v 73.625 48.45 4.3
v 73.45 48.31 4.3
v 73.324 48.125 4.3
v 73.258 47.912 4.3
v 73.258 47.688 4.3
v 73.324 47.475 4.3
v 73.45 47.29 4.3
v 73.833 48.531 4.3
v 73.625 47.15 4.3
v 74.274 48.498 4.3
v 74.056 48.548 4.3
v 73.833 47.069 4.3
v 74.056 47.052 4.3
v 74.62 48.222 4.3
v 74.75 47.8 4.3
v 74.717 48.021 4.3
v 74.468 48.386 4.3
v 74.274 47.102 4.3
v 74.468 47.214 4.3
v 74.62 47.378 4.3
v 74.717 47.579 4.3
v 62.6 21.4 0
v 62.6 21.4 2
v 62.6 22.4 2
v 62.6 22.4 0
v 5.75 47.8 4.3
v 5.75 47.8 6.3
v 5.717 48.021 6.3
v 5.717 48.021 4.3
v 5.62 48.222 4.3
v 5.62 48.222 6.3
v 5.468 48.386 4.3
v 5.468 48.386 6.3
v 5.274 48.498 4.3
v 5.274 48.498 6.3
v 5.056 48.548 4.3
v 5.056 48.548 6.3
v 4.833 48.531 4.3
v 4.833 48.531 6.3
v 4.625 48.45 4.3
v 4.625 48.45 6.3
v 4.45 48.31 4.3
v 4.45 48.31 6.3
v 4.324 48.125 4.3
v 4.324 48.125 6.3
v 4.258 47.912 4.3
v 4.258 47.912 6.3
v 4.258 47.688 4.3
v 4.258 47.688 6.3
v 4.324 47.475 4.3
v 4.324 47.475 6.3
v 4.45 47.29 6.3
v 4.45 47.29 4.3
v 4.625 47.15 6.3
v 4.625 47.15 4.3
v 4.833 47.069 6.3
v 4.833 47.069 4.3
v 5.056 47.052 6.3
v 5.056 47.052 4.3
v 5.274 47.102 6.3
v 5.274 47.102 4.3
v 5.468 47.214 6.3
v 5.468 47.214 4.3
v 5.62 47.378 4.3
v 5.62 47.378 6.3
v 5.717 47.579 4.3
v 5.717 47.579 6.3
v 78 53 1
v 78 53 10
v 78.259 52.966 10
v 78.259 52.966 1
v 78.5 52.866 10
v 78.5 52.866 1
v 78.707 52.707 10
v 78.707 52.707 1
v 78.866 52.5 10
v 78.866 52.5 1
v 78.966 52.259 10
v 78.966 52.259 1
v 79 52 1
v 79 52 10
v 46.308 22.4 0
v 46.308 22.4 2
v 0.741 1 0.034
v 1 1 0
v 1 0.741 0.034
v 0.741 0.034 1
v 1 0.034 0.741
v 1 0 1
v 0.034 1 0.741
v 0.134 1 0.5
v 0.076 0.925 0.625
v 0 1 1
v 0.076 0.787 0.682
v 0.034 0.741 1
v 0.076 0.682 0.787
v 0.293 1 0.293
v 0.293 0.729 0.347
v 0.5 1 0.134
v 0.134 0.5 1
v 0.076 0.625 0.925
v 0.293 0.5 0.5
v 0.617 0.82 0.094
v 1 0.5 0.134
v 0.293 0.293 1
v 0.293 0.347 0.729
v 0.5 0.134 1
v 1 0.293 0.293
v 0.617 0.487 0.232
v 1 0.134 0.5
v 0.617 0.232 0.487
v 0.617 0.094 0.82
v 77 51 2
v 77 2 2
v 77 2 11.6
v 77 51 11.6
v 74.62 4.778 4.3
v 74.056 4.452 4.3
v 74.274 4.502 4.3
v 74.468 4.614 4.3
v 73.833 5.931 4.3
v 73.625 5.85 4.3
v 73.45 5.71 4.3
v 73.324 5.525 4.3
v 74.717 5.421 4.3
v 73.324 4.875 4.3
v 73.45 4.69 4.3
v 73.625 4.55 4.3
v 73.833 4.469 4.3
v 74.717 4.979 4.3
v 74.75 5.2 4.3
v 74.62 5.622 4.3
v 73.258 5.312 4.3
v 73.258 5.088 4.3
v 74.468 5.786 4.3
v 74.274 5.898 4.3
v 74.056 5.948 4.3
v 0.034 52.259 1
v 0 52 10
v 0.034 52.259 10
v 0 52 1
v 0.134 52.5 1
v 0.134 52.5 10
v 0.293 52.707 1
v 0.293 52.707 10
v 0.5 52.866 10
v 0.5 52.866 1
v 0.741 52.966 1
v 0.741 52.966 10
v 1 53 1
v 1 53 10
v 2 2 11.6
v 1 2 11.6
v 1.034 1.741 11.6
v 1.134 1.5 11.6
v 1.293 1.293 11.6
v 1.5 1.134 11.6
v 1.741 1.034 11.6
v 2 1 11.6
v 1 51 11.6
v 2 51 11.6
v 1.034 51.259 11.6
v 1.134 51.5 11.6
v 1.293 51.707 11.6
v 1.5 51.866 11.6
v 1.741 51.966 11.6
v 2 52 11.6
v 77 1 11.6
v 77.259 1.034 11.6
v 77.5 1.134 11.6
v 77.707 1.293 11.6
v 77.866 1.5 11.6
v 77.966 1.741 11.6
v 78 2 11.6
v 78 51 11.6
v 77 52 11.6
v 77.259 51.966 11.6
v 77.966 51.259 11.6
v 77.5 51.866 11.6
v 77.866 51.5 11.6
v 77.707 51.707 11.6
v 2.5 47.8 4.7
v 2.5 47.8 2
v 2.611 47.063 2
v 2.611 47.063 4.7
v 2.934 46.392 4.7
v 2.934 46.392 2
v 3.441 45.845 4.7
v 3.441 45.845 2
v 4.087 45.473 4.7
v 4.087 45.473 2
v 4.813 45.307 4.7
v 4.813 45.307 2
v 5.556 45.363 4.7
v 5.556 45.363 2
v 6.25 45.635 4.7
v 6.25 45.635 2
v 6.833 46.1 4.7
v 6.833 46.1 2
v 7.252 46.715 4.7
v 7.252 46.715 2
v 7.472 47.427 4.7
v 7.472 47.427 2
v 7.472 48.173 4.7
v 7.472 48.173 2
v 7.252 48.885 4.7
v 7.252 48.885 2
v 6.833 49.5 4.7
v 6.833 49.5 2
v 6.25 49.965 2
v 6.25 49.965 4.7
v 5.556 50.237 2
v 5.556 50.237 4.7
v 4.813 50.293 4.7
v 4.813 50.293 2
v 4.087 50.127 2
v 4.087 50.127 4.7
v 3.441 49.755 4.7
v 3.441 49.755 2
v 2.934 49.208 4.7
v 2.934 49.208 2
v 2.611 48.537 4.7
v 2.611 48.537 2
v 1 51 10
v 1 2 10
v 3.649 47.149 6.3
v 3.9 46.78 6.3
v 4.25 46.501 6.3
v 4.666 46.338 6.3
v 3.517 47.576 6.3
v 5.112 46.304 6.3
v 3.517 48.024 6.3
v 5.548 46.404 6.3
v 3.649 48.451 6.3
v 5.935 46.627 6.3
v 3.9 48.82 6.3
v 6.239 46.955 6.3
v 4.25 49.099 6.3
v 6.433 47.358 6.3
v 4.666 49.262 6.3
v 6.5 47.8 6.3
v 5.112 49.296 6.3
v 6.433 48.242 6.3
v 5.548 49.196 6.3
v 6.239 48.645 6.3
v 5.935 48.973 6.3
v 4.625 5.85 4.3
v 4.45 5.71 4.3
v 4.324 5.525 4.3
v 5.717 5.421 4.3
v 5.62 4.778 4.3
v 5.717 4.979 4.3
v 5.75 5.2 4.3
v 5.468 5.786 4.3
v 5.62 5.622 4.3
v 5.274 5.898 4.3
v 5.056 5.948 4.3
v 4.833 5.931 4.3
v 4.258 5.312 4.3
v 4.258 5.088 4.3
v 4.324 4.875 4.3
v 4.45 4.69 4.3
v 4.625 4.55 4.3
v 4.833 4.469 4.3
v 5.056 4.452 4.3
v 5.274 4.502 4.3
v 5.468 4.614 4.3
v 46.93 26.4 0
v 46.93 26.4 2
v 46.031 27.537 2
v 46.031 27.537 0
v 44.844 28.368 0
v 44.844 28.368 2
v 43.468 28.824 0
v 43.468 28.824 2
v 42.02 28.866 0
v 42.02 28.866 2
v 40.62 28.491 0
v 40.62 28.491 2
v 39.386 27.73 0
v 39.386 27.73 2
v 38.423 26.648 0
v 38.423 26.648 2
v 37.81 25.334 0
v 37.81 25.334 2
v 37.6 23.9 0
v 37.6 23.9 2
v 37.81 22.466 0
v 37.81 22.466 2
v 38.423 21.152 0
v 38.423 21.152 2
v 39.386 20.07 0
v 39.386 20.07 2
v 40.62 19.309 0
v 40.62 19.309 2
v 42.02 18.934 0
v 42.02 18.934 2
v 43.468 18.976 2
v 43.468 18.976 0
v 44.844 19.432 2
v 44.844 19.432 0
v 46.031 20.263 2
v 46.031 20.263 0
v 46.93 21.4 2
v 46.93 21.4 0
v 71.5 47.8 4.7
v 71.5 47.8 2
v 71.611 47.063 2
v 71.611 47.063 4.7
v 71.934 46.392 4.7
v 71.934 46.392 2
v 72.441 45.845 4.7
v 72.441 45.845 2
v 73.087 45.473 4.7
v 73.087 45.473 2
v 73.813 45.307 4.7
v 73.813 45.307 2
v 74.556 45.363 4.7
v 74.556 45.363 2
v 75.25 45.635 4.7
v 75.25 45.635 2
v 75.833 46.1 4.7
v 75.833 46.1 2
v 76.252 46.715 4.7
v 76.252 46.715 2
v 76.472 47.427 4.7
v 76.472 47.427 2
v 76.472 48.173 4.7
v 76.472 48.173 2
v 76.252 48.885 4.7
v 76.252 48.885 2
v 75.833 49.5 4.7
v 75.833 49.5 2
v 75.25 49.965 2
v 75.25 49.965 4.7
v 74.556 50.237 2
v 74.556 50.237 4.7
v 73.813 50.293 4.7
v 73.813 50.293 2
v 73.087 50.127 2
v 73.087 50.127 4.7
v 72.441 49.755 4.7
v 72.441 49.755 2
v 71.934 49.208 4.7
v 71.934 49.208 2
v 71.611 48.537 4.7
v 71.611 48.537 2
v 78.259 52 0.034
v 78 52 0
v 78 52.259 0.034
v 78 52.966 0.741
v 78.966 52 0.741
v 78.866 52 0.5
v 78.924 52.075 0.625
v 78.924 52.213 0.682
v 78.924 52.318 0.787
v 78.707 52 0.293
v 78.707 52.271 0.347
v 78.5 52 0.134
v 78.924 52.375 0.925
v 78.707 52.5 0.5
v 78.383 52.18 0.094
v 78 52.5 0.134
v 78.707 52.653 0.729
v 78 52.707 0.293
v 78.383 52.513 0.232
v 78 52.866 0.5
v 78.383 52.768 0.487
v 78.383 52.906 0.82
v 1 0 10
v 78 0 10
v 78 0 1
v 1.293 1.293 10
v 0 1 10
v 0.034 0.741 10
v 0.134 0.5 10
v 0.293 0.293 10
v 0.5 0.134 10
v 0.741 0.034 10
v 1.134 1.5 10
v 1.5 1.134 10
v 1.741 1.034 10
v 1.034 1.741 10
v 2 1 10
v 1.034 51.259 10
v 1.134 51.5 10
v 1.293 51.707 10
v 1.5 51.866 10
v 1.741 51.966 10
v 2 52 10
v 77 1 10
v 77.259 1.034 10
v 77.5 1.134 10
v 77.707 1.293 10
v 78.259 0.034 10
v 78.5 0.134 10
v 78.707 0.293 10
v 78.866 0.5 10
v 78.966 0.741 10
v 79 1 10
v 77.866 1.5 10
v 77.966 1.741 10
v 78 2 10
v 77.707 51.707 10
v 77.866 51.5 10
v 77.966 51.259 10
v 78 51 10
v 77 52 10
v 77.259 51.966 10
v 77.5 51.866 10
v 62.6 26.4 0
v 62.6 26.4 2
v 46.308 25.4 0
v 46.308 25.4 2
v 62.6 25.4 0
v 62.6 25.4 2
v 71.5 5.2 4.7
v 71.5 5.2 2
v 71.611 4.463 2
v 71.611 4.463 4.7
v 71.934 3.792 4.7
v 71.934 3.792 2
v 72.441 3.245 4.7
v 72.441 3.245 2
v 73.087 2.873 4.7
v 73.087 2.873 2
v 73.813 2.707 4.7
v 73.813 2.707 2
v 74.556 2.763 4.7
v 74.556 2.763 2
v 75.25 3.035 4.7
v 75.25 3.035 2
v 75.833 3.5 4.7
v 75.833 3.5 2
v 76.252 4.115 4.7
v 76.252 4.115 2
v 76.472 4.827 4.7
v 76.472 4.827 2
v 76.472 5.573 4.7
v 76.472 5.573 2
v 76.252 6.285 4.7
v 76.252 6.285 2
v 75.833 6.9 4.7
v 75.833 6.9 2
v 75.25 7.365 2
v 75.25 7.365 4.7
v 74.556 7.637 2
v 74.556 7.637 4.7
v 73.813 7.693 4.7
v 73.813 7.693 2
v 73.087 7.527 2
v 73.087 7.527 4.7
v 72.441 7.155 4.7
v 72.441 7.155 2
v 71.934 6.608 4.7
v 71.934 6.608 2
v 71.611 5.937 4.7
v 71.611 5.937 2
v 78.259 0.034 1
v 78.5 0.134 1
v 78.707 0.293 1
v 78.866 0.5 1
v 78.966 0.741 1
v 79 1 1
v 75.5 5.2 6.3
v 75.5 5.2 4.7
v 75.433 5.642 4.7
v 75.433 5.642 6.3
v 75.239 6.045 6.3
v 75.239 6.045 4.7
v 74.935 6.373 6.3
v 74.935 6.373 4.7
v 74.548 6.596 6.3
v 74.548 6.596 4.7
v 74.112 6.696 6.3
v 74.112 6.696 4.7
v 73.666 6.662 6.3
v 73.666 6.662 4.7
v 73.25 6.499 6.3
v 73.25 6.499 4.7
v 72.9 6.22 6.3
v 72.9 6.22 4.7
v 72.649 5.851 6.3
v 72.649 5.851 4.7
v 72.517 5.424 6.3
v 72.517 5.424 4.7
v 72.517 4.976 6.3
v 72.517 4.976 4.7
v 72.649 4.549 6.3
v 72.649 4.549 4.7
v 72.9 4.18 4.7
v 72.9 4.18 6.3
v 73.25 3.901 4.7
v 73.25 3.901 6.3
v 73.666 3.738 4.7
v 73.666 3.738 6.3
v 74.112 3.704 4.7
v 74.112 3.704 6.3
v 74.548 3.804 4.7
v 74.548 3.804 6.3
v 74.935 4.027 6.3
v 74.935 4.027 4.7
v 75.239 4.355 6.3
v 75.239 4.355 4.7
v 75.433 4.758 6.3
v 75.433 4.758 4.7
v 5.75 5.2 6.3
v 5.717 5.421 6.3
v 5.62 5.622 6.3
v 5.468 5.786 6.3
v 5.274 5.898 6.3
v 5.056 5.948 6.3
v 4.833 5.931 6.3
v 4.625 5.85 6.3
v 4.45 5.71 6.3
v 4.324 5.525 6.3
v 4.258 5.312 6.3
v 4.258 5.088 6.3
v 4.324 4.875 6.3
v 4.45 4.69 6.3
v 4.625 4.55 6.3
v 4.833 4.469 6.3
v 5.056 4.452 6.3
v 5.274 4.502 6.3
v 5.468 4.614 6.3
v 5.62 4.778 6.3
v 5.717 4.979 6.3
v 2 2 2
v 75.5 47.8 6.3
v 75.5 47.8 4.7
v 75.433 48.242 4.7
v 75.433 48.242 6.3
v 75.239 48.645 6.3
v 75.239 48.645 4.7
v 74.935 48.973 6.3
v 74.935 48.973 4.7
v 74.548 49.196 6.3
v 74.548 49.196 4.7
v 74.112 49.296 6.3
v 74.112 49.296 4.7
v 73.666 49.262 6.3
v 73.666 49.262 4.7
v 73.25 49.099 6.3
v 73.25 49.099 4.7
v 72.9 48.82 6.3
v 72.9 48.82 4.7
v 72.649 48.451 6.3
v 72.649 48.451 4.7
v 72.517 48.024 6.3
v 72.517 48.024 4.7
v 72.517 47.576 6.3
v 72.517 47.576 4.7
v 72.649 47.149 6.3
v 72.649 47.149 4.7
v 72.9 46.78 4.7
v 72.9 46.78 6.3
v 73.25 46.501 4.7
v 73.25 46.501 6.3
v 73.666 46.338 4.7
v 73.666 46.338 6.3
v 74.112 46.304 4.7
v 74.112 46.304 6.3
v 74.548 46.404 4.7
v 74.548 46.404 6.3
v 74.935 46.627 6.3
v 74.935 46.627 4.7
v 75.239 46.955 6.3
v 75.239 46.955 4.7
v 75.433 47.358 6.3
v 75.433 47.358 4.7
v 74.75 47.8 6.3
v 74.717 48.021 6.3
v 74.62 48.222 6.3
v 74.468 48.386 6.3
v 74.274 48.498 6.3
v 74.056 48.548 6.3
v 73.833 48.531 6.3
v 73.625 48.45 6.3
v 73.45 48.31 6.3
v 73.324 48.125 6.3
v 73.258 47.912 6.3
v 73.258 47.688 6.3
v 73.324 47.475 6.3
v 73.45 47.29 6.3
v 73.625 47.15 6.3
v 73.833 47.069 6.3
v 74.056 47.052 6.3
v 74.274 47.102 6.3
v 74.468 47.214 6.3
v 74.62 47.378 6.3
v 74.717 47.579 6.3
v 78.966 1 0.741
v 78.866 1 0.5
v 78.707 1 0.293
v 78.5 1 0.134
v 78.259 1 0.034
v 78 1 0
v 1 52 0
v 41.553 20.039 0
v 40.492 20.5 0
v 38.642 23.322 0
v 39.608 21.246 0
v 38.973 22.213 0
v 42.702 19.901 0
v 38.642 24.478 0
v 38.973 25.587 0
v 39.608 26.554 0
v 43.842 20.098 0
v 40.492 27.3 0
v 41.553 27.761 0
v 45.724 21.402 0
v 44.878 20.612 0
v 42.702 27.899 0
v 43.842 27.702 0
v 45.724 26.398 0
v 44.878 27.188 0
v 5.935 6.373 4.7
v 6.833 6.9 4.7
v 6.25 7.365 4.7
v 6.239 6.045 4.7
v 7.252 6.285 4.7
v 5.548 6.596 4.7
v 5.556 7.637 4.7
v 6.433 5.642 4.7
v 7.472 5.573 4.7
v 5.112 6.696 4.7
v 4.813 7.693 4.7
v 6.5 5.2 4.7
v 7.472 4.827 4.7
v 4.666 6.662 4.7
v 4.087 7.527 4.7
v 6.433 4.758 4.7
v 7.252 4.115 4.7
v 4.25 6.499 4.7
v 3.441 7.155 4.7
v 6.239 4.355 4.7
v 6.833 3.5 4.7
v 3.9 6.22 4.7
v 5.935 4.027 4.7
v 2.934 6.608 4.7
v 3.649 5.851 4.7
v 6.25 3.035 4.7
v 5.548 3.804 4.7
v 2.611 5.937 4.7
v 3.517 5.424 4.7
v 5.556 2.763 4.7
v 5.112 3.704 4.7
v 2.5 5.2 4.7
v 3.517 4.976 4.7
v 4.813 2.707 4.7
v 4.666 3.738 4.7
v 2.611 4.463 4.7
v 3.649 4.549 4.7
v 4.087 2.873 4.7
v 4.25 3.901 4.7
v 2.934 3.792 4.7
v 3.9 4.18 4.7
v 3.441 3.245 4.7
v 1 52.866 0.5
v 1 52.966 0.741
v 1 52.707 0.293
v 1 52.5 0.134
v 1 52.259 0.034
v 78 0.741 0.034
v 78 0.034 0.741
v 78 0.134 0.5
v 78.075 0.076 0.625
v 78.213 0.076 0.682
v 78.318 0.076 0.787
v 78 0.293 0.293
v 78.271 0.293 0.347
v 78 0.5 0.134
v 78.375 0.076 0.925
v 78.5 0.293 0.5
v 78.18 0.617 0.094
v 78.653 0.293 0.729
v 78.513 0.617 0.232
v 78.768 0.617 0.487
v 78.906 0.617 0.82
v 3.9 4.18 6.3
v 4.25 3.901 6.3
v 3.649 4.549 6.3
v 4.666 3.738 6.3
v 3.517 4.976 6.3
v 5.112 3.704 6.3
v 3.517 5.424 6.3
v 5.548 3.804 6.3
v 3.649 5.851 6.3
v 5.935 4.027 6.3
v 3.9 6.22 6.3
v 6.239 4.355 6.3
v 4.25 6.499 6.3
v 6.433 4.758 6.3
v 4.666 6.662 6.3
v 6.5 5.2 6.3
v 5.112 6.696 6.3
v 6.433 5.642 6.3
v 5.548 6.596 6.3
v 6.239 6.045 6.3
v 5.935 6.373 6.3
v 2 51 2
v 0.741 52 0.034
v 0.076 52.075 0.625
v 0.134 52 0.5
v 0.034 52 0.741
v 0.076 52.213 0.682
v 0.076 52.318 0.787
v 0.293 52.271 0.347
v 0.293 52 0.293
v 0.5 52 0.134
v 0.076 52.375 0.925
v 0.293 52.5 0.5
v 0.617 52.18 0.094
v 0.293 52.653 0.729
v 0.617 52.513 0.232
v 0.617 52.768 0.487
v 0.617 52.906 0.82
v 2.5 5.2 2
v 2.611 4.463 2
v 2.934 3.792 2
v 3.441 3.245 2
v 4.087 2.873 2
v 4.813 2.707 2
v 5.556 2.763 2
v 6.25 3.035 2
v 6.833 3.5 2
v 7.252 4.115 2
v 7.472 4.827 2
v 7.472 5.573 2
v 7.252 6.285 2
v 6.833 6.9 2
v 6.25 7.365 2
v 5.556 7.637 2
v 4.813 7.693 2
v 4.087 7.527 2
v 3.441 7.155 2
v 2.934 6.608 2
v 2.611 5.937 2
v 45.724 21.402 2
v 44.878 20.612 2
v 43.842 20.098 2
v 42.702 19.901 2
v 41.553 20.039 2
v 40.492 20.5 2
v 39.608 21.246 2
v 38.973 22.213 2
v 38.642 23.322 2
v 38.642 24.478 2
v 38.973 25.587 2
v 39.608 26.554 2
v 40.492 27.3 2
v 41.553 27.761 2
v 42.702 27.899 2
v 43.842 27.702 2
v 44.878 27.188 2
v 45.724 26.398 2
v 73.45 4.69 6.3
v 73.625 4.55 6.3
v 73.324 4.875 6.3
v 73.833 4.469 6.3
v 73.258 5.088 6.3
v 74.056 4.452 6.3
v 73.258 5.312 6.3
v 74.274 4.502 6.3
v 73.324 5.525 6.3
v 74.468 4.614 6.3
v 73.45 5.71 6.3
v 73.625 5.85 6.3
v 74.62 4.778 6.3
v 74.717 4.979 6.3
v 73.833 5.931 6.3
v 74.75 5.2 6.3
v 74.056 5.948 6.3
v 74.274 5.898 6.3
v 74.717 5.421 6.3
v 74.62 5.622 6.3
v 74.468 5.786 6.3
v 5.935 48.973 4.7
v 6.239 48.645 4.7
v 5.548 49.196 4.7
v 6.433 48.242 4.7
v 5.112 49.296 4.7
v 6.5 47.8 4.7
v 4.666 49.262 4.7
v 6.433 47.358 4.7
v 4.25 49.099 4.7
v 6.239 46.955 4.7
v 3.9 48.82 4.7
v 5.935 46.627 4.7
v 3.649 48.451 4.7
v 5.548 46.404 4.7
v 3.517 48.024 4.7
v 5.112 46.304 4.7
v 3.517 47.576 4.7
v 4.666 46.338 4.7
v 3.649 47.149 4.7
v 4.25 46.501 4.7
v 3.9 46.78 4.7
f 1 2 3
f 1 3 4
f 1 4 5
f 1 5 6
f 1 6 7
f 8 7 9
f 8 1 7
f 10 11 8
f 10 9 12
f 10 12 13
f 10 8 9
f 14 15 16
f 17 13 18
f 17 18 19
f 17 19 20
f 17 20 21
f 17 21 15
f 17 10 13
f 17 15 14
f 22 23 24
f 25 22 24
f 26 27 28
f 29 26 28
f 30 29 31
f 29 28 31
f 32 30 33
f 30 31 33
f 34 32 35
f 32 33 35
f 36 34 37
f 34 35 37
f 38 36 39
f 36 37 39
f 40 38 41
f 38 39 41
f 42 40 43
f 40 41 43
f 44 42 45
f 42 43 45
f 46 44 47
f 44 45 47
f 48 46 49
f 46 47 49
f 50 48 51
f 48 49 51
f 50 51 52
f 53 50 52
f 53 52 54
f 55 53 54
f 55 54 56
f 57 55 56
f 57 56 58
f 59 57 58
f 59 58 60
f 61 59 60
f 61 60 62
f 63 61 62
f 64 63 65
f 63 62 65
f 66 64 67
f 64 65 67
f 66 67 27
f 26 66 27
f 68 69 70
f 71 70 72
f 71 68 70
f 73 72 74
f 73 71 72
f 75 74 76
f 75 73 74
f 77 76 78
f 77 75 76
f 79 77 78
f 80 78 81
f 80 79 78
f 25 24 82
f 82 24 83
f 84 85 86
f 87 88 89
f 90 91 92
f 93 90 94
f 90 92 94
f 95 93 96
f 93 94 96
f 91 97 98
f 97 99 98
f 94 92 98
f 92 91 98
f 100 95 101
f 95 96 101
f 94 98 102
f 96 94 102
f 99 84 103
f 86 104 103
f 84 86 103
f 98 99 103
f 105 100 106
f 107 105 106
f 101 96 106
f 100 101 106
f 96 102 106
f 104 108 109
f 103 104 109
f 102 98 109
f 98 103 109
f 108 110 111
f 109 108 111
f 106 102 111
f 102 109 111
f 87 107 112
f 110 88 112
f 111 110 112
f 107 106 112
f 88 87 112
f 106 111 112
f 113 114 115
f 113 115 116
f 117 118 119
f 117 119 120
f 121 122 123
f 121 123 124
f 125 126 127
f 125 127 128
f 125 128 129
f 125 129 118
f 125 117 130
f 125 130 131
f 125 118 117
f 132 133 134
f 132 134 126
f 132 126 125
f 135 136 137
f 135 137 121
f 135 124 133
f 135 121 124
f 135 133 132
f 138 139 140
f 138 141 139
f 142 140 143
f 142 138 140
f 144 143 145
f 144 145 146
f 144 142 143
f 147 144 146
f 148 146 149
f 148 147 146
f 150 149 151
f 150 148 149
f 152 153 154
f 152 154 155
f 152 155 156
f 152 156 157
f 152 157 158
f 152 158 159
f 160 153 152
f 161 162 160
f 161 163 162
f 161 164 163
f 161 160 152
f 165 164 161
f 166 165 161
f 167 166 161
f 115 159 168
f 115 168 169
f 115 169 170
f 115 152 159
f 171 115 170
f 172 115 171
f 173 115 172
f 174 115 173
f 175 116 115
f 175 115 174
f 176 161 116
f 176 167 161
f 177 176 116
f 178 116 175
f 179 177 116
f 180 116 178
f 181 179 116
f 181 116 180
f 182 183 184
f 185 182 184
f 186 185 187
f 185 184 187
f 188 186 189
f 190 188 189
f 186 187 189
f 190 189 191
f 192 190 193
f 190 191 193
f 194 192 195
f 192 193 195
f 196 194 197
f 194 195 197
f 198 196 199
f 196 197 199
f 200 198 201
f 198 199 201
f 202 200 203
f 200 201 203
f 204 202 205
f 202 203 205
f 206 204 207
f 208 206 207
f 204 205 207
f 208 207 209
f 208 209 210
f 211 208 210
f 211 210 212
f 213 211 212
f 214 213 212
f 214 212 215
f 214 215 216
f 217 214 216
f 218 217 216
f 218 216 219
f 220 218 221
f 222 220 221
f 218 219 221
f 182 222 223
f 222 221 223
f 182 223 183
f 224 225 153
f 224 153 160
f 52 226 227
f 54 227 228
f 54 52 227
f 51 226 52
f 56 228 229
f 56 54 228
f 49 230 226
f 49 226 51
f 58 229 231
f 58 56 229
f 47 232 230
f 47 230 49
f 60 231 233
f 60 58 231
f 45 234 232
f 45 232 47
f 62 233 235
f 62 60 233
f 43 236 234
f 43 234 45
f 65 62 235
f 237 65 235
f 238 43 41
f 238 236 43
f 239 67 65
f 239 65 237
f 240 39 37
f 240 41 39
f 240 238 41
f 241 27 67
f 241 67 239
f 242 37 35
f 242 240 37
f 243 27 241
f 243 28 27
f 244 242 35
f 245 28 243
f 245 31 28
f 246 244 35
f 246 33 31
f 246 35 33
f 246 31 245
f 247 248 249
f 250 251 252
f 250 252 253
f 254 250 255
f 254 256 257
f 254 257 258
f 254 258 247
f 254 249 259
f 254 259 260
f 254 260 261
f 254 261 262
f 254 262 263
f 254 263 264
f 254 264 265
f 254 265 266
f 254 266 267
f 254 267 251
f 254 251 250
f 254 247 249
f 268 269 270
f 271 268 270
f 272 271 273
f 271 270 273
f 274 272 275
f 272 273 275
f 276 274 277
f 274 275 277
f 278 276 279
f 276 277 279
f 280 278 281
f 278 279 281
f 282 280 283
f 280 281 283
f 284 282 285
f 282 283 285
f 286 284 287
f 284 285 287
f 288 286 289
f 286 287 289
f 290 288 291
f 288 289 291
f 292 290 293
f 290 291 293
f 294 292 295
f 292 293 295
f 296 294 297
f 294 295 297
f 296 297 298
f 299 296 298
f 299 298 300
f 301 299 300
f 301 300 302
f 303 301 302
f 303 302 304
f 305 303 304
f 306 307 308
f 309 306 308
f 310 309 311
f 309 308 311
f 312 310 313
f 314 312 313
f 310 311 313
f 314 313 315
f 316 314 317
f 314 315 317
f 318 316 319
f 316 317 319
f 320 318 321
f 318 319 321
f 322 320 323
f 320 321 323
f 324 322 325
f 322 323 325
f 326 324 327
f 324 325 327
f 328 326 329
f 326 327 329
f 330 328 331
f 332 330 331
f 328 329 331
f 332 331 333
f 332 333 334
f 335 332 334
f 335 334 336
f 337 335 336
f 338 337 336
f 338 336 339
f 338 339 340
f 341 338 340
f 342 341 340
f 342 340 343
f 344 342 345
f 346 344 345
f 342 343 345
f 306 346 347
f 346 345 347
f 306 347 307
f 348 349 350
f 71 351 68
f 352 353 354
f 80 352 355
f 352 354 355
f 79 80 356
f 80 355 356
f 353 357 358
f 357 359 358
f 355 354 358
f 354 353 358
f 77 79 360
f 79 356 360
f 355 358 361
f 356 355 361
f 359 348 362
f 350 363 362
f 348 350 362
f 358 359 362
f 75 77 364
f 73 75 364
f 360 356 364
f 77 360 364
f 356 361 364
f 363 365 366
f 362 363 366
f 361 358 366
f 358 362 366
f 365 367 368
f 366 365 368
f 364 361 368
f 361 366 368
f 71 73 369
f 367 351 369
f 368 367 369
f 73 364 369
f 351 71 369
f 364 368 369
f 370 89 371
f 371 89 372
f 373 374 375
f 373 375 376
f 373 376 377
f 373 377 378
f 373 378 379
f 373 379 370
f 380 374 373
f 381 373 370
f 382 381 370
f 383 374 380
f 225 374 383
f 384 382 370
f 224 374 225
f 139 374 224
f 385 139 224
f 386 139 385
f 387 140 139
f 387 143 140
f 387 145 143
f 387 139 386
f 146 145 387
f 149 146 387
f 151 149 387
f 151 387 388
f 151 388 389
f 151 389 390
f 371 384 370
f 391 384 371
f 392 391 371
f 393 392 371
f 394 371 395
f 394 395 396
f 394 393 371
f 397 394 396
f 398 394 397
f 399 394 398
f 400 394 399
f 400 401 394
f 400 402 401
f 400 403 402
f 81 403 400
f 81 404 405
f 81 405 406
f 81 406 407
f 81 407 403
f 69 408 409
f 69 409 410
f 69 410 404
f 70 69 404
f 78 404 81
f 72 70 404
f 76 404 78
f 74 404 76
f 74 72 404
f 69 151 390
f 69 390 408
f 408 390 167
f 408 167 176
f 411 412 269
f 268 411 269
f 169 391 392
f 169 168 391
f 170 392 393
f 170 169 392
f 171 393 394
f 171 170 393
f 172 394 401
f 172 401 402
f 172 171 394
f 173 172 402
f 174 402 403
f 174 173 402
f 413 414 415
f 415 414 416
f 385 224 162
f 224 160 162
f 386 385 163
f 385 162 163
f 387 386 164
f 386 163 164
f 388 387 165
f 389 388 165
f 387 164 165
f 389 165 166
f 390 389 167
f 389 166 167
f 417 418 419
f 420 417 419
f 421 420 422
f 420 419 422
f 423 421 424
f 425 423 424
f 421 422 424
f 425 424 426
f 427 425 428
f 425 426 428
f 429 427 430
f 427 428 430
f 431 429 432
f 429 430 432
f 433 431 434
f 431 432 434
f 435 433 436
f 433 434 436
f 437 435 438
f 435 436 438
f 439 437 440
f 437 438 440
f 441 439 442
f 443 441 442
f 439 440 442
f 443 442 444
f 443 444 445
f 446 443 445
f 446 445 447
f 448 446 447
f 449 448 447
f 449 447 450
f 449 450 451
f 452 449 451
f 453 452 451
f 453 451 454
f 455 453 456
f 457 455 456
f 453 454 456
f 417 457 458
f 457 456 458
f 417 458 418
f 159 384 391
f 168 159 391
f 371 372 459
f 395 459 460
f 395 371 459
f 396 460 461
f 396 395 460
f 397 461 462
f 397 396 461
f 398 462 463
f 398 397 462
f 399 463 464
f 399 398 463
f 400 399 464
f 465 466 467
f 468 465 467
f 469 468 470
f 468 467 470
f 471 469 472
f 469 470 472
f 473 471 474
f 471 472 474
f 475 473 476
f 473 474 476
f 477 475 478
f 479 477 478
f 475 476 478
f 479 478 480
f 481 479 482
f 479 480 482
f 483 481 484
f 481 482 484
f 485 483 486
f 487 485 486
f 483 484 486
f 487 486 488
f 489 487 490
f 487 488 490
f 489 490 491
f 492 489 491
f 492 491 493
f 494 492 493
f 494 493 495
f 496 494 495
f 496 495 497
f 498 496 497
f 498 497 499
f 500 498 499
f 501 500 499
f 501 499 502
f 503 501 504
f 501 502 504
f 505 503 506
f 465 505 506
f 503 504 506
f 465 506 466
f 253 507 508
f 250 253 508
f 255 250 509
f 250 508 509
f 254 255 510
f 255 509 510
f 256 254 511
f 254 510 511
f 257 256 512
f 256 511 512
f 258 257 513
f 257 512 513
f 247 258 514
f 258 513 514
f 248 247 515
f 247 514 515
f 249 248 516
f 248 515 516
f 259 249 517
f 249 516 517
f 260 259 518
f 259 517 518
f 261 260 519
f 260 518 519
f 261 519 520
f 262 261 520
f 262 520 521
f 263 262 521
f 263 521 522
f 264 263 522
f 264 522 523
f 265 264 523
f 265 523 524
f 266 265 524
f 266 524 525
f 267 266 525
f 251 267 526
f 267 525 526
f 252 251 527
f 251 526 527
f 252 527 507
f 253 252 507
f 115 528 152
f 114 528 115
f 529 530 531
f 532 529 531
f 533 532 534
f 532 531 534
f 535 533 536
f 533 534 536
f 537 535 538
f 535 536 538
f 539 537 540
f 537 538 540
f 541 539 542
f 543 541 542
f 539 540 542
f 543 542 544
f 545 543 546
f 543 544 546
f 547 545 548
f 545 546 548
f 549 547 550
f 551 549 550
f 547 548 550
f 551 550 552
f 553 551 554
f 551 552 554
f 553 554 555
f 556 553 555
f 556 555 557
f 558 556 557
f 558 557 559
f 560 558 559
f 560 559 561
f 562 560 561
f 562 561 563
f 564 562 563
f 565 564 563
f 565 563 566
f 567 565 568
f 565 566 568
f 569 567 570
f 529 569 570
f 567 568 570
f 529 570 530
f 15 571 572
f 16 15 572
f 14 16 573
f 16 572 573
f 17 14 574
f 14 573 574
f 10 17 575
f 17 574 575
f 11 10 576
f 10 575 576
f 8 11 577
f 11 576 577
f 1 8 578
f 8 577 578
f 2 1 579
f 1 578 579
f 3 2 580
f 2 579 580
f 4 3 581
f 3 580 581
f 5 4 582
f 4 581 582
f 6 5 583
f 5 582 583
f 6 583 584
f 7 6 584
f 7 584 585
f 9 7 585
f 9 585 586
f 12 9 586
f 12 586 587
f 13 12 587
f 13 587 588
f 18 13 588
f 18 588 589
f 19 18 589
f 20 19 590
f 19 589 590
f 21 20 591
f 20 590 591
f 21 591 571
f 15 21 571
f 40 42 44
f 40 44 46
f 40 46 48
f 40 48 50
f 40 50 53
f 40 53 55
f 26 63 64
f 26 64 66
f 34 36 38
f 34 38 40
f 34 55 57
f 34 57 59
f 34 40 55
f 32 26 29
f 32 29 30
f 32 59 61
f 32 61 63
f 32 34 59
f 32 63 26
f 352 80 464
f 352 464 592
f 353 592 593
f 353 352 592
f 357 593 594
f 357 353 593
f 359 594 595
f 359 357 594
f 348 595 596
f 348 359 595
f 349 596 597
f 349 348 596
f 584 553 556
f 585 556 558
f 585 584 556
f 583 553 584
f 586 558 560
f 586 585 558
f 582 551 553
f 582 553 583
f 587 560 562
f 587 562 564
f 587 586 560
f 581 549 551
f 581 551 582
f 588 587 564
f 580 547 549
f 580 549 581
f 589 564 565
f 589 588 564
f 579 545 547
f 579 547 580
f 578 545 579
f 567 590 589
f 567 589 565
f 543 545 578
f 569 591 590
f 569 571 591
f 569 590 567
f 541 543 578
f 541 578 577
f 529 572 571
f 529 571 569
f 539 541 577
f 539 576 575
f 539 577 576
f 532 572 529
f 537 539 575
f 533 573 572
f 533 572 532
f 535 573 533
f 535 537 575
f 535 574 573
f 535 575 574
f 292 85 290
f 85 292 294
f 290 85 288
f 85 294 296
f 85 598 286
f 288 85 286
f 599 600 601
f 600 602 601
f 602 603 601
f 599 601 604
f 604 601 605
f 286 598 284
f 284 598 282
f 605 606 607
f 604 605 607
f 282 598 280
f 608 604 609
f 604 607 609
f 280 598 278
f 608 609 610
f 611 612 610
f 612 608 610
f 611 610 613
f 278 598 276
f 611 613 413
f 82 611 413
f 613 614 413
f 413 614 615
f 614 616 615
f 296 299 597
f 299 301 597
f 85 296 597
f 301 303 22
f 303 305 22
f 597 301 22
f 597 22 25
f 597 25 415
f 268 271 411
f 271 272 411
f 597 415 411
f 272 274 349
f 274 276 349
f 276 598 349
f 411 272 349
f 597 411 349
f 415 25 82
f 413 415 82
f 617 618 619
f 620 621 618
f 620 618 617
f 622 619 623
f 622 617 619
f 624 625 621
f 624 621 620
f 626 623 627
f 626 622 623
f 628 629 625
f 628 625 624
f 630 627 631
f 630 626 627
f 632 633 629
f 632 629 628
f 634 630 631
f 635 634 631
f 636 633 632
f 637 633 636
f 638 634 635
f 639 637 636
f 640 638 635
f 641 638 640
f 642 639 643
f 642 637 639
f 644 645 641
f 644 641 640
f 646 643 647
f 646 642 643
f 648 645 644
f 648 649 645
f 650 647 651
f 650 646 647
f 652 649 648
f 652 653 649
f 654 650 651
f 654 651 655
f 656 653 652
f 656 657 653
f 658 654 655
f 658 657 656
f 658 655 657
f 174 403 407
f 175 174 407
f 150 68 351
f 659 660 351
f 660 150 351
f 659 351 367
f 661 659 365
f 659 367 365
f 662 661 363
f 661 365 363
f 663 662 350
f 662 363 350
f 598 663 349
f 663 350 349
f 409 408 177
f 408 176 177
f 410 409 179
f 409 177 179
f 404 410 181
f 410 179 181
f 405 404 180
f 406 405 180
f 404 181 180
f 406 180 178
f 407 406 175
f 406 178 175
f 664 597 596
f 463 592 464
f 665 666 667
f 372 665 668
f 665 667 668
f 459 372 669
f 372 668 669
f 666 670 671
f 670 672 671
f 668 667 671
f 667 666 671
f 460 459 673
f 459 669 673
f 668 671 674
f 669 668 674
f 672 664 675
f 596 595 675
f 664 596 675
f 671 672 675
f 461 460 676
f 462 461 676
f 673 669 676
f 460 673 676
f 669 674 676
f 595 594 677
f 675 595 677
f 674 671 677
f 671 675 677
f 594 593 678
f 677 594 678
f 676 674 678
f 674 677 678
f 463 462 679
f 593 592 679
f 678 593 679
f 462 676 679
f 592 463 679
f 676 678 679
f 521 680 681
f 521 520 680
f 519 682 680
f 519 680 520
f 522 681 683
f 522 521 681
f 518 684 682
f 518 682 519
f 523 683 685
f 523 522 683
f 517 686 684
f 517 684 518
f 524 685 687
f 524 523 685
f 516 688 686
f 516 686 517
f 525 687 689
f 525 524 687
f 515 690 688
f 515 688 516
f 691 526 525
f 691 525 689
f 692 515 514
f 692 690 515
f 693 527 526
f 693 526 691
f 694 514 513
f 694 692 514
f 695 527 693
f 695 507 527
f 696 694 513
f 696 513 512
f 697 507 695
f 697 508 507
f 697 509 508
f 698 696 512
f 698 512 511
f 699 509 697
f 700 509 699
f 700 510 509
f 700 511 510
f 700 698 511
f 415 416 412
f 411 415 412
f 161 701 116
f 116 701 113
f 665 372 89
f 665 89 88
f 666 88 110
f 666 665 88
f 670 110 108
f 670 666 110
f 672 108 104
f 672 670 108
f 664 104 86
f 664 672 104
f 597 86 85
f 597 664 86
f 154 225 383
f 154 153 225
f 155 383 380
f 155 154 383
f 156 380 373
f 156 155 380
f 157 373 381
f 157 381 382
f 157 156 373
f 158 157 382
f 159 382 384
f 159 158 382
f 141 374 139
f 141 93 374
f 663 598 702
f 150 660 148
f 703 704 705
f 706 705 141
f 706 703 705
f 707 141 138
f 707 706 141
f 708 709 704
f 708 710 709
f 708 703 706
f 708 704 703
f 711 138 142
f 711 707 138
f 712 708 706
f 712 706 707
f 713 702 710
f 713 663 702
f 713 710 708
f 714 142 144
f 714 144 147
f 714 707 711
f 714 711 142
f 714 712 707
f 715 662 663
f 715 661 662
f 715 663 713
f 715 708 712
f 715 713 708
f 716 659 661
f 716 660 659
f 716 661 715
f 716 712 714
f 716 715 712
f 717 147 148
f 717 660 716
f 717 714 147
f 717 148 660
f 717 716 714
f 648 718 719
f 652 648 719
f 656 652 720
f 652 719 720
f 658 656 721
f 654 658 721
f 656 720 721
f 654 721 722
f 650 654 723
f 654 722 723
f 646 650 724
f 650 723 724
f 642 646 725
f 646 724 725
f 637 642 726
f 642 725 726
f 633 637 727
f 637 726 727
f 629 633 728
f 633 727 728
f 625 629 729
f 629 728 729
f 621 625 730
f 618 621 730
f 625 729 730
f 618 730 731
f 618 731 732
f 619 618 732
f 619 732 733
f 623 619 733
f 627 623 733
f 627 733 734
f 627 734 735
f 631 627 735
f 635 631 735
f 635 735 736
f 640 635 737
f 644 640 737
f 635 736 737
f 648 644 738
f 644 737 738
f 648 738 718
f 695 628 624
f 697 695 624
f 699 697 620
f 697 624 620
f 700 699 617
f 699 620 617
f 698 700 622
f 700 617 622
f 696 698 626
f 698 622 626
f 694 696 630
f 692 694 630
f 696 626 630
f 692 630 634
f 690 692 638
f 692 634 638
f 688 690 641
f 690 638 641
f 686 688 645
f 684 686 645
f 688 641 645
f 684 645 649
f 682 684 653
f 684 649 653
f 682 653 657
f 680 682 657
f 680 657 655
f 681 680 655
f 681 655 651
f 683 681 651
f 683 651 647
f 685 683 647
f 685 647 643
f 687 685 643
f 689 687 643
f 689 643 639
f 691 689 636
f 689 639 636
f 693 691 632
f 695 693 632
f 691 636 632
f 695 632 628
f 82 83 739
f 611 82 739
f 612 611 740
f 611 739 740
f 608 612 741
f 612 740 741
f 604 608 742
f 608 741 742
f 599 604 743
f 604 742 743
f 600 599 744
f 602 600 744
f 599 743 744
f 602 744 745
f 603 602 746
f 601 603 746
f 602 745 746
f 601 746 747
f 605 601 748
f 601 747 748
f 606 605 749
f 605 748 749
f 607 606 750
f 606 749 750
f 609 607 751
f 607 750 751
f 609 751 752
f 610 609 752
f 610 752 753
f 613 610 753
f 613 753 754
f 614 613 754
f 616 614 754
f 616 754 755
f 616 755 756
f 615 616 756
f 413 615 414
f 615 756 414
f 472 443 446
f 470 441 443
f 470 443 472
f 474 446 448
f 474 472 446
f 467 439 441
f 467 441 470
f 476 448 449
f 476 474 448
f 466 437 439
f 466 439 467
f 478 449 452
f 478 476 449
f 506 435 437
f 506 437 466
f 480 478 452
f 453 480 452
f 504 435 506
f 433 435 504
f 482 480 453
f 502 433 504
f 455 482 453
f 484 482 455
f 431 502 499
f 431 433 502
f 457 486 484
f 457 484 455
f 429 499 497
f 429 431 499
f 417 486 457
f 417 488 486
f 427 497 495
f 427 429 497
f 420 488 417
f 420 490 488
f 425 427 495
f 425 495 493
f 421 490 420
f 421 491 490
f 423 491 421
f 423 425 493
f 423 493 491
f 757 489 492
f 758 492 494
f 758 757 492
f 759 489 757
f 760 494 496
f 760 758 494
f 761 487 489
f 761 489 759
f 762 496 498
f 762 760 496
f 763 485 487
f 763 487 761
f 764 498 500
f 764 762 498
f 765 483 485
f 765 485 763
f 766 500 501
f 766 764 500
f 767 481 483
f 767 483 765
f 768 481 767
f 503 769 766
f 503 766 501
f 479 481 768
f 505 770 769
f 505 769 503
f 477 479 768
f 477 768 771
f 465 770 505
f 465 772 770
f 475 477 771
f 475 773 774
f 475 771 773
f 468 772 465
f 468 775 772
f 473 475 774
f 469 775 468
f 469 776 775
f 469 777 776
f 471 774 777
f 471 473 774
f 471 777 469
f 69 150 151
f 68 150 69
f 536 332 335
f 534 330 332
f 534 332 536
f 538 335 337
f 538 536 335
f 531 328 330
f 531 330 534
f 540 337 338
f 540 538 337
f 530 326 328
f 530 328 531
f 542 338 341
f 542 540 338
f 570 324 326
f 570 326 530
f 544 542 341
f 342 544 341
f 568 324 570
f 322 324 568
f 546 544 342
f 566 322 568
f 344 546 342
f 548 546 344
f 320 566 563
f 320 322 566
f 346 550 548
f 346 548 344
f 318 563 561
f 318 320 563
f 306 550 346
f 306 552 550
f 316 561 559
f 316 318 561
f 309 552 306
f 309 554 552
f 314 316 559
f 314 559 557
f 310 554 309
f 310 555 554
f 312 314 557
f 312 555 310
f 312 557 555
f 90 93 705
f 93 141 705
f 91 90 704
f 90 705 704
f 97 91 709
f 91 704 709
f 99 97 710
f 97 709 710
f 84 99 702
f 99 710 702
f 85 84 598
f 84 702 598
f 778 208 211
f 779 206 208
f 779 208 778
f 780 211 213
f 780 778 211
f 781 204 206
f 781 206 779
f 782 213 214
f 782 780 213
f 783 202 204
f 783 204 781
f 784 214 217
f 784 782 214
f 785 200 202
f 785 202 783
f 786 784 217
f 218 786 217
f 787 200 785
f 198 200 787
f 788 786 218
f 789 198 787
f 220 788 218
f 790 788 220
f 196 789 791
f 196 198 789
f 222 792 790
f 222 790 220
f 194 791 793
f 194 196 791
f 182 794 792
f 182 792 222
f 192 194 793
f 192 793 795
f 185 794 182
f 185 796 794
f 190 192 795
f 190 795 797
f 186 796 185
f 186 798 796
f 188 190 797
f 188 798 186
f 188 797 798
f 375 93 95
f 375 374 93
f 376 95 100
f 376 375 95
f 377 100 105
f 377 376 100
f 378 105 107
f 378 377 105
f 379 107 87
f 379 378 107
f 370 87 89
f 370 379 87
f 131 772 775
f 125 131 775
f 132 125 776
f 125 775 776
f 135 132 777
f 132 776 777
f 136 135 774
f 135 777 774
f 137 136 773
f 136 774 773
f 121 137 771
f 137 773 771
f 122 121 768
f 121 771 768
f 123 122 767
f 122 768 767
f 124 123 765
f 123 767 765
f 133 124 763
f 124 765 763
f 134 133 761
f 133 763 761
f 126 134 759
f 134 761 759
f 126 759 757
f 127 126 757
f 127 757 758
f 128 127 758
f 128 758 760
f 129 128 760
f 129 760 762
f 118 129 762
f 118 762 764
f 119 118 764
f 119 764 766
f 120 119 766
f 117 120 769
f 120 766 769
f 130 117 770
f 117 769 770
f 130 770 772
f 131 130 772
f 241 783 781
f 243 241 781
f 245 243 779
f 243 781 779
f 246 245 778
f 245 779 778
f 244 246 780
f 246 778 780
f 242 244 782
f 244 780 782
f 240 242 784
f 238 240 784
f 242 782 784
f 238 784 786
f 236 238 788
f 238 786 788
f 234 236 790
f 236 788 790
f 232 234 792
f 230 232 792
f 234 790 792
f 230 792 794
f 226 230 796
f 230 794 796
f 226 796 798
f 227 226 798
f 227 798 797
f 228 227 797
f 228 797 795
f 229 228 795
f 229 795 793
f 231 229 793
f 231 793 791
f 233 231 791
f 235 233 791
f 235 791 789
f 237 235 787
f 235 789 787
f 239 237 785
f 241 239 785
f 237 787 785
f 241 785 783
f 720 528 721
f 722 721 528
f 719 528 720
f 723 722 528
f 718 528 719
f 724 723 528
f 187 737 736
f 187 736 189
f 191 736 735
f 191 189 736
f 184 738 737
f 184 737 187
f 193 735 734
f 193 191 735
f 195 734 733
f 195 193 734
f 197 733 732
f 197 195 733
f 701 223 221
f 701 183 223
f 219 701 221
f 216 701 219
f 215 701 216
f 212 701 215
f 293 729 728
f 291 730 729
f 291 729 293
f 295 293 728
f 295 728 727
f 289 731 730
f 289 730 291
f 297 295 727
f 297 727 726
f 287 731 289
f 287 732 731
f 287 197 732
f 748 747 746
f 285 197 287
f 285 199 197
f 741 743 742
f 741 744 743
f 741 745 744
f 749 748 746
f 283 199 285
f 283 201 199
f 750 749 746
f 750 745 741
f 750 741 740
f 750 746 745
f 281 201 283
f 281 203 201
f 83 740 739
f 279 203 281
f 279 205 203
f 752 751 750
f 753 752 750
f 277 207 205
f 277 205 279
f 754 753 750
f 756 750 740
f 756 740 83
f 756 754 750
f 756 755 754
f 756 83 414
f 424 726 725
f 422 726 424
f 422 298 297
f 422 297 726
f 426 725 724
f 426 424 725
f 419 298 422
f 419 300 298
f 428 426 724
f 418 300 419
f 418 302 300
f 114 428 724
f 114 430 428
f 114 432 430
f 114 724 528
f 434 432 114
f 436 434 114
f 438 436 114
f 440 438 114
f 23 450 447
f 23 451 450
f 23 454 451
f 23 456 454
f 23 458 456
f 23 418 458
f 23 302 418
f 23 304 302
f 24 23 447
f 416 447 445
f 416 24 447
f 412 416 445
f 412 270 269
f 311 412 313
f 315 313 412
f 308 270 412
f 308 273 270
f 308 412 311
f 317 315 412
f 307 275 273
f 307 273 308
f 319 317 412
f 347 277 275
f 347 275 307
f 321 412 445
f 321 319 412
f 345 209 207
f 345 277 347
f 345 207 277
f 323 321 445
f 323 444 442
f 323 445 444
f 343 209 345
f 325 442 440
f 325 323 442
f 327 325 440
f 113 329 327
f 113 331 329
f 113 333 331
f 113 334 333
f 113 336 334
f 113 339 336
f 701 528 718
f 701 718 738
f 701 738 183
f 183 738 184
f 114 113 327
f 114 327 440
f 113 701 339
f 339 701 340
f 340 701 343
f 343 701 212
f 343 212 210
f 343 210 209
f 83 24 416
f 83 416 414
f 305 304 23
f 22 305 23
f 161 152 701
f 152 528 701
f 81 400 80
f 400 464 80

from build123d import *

# Parameters (mm, degrees)
SKETCH1_W           = 79
SKETCH1_H           = 53
BOSS_EXTRUDE1_DEPTH = 2
SKETCH2_R           = 2.5
BOSS_EXTRUDE2_DEPTH = 2.7
SKETCH3_R           = 1.5
BOSS_EXTRUDE3_DEPTH = 1.6
SKETCH5_R           = 0.75
CUT_EXTRUDE1_DEPTH  = 2
SKETCH6_W           = 79
SKETCH6_H           = 53
SKETCH6_W_2         = 75
SKETCH6_H_2         = 49
BOSS_EXTRUDE4_DEPTH = 8
SKETCH7_W           = 77
SKETCH7_H           = 51
SKETCH7_W_2         = 75
SKETCH7_H_2         = 49
BOSS_EXTRUDE5_DEPTH = 1.6
CUT_EXTRUDE2_DEPTH  = 2
FILLET1_R           = 1


with BuildPart() as part:
    # Sketch1 → Boss-Extrude1 (new body)
    with BuildSketch(Plane.XY):
        with Locations((39.5, 26.5)):
            Rectangle(SKETCH1_W, SKETCH1_H)
    extrude(amount=BOSS_EXTRUDE1_DEPTH)

    # Sketch2 → Boss-Extrude2 (add)
    with BuildSketch(Plane.XY.offset(2)):
        with Locations(Location((5, 47.8, 0), (0, 0, 180))):
            Circle(SKETCH2_R)
        with Locations(Location((74, 47.8, 0), (0, 0, 180))):
            Circle(SKETCH2_R)
        with Locations(Location((74, 5.2, 0), (0, 0, 180))):
            Circle(SKETCH2_R)
        with Locations(Location((5, 5.2, 0), (0, 0, 180))):
            Circle(SKETCH2_R)
    extrude(amount=BOSS_EXTRUDE2_DEPTH)

    # Sketch3 → Boss-Extrude3 (add)
    with BuildSketch(Plane.XY.offset(4.7)):
        with Locations((5, 47.8)):
            Circle(SKETCH3_R)
        with Locations((5, 5.2)):
            Circle(SKETCH3_R)
        with Locations((74, 47.8)):
            Circle(SKETCH3_R)
        with Locations((74, 5.2)):
            Circle(SKETCH3_R)
    extrude(amount=BOSS_EXTRUDE3_DEPTH)

    # Sketch5 → Cut-Extrude1 (cut)
    with BuildSketch(Plane.XY.offset(6.3)):
        with Locations((74, 5.2)):
            Circle(SKETCH5_R)
        with Locations((74, 47.8)):
            Circle(SKETCH5_R)
        with Locations((5, 47.8)):
            Circle(SKETCH5_R)
        with Locations((5, 5.2)):
            Circle(SKETCH5_R)
    extrude(amount=-CUT_EXTRUDE1_DEPTH, mode=Mode.SUBTRACT)

    # Sketch6 → Boss-Extrude4 (add)
    with BuildSketch(Plane.XY.offset(2)):
        with Locations((39.5, 26.5)):
            Rectangle(SKETCH6_W, SKETCH6_H)
        with Locations((39.5, 26.5)):
            Rectangle(SKETCH6_W_2, SKETCH6_H_2, mode=Mode.SUBTRACT)
    extrude(amount=BOSS_EXTRUDE4_DEPTH)

    # Sketch7 → Boss-Extrude5 (add)
    with BuildSketch(Plane.XY.offset(10)):
        with Locations((39.5, 26.5)):
            Rectangle(SKETCH7_W, SKETCH7_H)
        with Locations((39.5, 26.5)):
            Rectangle(SKETCH7_W_2, SKETCH7_H_2, mode=Mode.SUBTRACT)
    extrude(amount=BOSS_EXTRUDE5_DEPTH)

    # Sketch8 → Cut-Extrude2 (cut)
    with BuildSketch(Plane.XY.offset(2)):
        with BuildLine():
            Line((46.930127019, 21.4), (62.6, 21.4))
            Line((62.6, 21.4), (62.6, 22.4))
            Line((62.6, 22.4), (46.308099244, 22.4))
            ThreePointArc((46.308099244, 22.4), (38.6, 23.9), (46.308099244, 25.4))
            Line((46.308099244, 25.4), (62.6, 25.4))
            Line((62.6, 25.4), (62.6, 26.4))
            Line((62.6, 26.4), (46.930127019, 26.4))
            ThreePointArc((46.930127019, 26.4), (37.6, 23.9), (46.930127019, 21.4))
        make_face()
    extrude(amount=-CUT_EXTRUDE2_DEPTH, mode=Mode.SUBTRACT)

    # Fillet1
    fillet1_edges = [part.edges().sort_by_distance(p)[0] for p in [
        (39.5, 53, 0),
        (79, 26.5, 0),
        (39.5, 0, 0),
        (0, 26.5, 0),
        (0, 53, 5),
        (79, 53, 5),
        (79, 0, 5),
        (0, 0, 5),
        (1, 52, 10.8),
        (1, 1, 10.8),
        (78, 1, 10.8),
        (78, 52, 10.8),
    ]]
    fillet(fillet1_edges, radius=FILLET1_R)


solid = part.part
